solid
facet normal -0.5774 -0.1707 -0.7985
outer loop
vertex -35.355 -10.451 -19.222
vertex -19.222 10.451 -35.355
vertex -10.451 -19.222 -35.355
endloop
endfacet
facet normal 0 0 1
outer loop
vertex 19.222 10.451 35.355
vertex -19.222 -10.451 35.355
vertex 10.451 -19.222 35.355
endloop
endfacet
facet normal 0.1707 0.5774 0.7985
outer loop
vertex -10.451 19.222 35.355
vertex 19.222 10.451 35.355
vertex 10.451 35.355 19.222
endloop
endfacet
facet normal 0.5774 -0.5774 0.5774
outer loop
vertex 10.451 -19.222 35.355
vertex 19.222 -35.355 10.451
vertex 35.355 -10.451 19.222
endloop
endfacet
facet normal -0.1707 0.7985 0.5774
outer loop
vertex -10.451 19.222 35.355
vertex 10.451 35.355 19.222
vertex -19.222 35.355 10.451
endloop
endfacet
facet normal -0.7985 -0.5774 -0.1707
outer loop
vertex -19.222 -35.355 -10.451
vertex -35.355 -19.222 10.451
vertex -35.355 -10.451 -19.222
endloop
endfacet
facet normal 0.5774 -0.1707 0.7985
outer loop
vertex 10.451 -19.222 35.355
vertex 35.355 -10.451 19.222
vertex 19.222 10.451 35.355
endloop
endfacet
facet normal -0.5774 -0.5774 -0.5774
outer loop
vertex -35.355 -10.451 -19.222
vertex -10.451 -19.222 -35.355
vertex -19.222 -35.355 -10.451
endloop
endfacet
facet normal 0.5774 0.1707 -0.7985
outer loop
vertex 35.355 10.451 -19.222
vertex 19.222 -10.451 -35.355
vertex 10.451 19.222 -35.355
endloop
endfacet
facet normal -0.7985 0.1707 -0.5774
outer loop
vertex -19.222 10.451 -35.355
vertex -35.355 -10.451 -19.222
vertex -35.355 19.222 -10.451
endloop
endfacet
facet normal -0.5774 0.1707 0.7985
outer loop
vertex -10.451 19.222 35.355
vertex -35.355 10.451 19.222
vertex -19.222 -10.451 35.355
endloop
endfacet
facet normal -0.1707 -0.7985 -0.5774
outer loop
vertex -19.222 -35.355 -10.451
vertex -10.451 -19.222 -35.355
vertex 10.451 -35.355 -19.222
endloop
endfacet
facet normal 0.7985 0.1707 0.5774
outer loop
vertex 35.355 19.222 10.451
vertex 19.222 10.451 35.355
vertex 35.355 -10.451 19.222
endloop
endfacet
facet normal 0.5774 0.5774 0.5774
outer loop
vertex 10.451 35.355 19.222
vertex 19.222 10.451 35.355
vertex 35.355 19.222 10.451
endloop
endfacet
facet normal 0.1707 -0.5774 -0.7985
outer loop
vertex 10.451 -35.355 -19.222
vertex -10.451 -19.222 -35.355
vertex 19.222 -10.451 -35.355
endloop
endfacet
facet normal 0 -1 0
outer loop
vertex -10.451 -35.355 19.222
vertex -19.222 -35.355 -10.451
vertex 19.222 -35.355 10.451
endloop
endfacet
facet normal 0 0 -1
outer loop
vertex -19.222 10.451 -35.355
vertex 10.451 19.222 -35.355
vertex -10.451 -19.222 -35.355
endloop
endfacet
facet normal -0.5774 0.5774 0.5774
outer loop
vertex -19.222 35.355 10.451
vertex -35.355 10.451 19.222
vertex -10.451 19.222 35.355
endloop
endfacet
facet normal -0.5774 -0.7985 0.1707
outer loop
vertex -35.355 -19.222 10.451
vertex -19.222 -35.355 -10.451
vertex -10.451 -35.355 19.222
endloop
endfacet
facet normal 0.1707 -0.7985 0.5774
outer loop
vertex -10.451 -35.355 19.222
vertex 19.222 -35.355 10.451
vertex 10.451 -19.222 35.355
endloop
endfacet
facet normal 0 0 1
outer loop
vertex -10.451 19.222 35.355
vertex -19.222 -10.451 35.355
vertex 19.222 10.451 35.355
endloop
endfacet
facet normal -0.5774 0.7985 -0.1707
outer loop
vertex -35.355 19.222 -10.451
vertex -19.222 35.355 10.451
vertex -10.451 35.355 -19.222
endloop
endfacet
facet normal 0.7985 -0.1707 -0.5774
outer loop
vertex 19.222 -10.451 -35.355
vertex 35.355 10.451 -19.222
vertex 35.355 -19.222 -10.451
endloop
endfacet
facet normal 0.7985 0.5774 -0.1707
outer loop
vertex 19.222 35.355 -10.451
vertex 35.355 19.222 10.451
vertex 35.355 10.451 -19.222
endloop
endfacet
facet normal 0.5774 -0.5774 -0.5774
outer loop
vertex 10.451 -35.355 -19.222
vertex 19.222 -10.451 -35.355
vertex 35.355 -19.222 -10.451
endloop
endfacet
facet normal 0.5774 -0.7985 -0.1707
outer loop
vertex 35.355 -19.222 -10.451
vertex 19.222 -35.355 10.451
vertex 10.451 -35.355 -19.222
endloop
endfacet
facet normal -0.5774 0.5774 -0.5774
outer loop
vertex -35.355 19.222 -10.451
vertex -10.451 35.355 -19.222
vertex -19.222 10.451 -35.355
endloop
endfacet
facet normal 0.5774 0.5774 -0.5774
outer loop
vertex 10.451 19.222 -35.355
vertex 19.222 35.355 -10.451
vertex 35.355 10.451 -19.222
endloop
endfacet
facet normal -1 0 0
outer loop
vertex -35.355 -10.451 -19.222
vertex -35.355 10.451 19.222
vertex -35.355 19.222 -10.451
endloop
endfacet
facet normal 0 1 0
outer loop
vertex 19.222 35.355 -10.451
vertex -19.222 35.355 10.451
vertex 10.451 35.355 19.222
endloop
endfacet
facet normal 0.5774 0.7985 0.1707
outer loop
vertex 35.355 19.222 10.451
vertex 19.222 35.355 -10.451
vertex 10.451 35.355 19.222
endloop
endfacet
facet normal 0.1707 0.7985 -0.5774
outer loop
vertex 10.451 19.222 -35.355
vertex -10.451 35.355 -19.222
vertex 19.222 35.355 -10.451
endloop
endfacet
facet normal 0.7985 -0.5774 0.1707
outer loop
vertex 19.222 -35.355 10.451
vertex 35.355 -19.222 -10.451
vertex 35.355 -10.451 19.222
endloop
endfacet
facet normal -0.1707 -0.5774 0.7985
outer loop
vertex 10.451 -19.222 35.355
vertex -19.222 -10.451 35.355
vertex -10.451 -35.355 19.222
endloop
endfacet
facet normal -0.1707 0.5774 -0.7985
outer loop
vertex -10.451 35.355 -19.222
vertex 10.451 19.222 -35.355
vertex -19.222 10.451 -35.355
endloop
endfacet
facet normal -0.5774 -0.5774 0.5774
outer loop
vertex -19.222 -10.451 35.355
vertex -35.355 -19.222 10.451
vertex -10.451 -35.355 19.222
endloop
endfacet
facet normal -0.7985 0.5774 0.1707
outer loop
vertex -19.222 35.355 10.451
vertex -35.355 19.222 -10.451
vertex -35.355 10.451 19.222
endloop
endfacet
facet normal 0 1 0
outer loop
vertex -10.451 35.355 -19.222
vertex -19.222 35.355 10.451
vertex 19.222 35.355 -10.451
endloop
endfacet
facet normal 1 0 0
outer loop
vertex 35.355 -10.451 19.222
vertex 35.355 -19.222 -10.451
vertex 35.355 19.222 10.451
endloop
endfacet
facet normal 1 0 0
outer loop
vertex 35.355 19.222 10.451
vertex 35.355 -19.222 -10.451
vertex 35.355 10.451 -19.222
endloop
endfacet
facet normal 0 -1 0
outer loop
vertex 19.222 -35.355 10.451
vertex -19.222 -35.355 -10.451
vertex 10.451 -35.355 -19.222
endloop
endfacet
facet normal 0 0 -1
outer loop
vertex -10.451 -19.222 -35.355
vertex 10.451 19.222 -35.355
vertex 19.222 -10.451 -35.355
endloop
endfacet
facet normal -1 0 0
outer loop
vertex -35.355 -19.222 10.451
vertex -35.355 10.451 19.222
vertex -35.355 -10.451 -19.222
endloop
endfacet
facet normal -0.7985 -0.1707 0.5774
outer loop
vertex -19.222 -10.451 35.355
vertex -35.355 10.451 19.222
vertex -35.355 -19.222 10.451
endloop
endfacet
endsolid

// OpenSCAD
function tribo(n, a, b, c) = n == 0 ? c / b : tribo(n - 1, b, c, a + b + c);
t = tribo(20, 0, 0, 1);
echo(t);

epsilon = 0.00001;
scale = 25 * sqrt(2) / t;
module g(x, y, z) {
    translate(scale * [x, y, z])
        cube(epsilon, center=true);
}

module h(x, y, z) {
    g(x, y, z);
    g(z, x, y);
    g(y, z, x);
}

hull() {
    h( t,  1/t, -1);
    h(-1/t,  t, -1);
    h(-t, -1/t, -1);
    h( 1/t, -t, -1);

    h(-t,  1/t, 1);
    h( 1/t,  t, 1);
    h( t, -1/t, 1);
    h(-1/t, -t, 1);
}
